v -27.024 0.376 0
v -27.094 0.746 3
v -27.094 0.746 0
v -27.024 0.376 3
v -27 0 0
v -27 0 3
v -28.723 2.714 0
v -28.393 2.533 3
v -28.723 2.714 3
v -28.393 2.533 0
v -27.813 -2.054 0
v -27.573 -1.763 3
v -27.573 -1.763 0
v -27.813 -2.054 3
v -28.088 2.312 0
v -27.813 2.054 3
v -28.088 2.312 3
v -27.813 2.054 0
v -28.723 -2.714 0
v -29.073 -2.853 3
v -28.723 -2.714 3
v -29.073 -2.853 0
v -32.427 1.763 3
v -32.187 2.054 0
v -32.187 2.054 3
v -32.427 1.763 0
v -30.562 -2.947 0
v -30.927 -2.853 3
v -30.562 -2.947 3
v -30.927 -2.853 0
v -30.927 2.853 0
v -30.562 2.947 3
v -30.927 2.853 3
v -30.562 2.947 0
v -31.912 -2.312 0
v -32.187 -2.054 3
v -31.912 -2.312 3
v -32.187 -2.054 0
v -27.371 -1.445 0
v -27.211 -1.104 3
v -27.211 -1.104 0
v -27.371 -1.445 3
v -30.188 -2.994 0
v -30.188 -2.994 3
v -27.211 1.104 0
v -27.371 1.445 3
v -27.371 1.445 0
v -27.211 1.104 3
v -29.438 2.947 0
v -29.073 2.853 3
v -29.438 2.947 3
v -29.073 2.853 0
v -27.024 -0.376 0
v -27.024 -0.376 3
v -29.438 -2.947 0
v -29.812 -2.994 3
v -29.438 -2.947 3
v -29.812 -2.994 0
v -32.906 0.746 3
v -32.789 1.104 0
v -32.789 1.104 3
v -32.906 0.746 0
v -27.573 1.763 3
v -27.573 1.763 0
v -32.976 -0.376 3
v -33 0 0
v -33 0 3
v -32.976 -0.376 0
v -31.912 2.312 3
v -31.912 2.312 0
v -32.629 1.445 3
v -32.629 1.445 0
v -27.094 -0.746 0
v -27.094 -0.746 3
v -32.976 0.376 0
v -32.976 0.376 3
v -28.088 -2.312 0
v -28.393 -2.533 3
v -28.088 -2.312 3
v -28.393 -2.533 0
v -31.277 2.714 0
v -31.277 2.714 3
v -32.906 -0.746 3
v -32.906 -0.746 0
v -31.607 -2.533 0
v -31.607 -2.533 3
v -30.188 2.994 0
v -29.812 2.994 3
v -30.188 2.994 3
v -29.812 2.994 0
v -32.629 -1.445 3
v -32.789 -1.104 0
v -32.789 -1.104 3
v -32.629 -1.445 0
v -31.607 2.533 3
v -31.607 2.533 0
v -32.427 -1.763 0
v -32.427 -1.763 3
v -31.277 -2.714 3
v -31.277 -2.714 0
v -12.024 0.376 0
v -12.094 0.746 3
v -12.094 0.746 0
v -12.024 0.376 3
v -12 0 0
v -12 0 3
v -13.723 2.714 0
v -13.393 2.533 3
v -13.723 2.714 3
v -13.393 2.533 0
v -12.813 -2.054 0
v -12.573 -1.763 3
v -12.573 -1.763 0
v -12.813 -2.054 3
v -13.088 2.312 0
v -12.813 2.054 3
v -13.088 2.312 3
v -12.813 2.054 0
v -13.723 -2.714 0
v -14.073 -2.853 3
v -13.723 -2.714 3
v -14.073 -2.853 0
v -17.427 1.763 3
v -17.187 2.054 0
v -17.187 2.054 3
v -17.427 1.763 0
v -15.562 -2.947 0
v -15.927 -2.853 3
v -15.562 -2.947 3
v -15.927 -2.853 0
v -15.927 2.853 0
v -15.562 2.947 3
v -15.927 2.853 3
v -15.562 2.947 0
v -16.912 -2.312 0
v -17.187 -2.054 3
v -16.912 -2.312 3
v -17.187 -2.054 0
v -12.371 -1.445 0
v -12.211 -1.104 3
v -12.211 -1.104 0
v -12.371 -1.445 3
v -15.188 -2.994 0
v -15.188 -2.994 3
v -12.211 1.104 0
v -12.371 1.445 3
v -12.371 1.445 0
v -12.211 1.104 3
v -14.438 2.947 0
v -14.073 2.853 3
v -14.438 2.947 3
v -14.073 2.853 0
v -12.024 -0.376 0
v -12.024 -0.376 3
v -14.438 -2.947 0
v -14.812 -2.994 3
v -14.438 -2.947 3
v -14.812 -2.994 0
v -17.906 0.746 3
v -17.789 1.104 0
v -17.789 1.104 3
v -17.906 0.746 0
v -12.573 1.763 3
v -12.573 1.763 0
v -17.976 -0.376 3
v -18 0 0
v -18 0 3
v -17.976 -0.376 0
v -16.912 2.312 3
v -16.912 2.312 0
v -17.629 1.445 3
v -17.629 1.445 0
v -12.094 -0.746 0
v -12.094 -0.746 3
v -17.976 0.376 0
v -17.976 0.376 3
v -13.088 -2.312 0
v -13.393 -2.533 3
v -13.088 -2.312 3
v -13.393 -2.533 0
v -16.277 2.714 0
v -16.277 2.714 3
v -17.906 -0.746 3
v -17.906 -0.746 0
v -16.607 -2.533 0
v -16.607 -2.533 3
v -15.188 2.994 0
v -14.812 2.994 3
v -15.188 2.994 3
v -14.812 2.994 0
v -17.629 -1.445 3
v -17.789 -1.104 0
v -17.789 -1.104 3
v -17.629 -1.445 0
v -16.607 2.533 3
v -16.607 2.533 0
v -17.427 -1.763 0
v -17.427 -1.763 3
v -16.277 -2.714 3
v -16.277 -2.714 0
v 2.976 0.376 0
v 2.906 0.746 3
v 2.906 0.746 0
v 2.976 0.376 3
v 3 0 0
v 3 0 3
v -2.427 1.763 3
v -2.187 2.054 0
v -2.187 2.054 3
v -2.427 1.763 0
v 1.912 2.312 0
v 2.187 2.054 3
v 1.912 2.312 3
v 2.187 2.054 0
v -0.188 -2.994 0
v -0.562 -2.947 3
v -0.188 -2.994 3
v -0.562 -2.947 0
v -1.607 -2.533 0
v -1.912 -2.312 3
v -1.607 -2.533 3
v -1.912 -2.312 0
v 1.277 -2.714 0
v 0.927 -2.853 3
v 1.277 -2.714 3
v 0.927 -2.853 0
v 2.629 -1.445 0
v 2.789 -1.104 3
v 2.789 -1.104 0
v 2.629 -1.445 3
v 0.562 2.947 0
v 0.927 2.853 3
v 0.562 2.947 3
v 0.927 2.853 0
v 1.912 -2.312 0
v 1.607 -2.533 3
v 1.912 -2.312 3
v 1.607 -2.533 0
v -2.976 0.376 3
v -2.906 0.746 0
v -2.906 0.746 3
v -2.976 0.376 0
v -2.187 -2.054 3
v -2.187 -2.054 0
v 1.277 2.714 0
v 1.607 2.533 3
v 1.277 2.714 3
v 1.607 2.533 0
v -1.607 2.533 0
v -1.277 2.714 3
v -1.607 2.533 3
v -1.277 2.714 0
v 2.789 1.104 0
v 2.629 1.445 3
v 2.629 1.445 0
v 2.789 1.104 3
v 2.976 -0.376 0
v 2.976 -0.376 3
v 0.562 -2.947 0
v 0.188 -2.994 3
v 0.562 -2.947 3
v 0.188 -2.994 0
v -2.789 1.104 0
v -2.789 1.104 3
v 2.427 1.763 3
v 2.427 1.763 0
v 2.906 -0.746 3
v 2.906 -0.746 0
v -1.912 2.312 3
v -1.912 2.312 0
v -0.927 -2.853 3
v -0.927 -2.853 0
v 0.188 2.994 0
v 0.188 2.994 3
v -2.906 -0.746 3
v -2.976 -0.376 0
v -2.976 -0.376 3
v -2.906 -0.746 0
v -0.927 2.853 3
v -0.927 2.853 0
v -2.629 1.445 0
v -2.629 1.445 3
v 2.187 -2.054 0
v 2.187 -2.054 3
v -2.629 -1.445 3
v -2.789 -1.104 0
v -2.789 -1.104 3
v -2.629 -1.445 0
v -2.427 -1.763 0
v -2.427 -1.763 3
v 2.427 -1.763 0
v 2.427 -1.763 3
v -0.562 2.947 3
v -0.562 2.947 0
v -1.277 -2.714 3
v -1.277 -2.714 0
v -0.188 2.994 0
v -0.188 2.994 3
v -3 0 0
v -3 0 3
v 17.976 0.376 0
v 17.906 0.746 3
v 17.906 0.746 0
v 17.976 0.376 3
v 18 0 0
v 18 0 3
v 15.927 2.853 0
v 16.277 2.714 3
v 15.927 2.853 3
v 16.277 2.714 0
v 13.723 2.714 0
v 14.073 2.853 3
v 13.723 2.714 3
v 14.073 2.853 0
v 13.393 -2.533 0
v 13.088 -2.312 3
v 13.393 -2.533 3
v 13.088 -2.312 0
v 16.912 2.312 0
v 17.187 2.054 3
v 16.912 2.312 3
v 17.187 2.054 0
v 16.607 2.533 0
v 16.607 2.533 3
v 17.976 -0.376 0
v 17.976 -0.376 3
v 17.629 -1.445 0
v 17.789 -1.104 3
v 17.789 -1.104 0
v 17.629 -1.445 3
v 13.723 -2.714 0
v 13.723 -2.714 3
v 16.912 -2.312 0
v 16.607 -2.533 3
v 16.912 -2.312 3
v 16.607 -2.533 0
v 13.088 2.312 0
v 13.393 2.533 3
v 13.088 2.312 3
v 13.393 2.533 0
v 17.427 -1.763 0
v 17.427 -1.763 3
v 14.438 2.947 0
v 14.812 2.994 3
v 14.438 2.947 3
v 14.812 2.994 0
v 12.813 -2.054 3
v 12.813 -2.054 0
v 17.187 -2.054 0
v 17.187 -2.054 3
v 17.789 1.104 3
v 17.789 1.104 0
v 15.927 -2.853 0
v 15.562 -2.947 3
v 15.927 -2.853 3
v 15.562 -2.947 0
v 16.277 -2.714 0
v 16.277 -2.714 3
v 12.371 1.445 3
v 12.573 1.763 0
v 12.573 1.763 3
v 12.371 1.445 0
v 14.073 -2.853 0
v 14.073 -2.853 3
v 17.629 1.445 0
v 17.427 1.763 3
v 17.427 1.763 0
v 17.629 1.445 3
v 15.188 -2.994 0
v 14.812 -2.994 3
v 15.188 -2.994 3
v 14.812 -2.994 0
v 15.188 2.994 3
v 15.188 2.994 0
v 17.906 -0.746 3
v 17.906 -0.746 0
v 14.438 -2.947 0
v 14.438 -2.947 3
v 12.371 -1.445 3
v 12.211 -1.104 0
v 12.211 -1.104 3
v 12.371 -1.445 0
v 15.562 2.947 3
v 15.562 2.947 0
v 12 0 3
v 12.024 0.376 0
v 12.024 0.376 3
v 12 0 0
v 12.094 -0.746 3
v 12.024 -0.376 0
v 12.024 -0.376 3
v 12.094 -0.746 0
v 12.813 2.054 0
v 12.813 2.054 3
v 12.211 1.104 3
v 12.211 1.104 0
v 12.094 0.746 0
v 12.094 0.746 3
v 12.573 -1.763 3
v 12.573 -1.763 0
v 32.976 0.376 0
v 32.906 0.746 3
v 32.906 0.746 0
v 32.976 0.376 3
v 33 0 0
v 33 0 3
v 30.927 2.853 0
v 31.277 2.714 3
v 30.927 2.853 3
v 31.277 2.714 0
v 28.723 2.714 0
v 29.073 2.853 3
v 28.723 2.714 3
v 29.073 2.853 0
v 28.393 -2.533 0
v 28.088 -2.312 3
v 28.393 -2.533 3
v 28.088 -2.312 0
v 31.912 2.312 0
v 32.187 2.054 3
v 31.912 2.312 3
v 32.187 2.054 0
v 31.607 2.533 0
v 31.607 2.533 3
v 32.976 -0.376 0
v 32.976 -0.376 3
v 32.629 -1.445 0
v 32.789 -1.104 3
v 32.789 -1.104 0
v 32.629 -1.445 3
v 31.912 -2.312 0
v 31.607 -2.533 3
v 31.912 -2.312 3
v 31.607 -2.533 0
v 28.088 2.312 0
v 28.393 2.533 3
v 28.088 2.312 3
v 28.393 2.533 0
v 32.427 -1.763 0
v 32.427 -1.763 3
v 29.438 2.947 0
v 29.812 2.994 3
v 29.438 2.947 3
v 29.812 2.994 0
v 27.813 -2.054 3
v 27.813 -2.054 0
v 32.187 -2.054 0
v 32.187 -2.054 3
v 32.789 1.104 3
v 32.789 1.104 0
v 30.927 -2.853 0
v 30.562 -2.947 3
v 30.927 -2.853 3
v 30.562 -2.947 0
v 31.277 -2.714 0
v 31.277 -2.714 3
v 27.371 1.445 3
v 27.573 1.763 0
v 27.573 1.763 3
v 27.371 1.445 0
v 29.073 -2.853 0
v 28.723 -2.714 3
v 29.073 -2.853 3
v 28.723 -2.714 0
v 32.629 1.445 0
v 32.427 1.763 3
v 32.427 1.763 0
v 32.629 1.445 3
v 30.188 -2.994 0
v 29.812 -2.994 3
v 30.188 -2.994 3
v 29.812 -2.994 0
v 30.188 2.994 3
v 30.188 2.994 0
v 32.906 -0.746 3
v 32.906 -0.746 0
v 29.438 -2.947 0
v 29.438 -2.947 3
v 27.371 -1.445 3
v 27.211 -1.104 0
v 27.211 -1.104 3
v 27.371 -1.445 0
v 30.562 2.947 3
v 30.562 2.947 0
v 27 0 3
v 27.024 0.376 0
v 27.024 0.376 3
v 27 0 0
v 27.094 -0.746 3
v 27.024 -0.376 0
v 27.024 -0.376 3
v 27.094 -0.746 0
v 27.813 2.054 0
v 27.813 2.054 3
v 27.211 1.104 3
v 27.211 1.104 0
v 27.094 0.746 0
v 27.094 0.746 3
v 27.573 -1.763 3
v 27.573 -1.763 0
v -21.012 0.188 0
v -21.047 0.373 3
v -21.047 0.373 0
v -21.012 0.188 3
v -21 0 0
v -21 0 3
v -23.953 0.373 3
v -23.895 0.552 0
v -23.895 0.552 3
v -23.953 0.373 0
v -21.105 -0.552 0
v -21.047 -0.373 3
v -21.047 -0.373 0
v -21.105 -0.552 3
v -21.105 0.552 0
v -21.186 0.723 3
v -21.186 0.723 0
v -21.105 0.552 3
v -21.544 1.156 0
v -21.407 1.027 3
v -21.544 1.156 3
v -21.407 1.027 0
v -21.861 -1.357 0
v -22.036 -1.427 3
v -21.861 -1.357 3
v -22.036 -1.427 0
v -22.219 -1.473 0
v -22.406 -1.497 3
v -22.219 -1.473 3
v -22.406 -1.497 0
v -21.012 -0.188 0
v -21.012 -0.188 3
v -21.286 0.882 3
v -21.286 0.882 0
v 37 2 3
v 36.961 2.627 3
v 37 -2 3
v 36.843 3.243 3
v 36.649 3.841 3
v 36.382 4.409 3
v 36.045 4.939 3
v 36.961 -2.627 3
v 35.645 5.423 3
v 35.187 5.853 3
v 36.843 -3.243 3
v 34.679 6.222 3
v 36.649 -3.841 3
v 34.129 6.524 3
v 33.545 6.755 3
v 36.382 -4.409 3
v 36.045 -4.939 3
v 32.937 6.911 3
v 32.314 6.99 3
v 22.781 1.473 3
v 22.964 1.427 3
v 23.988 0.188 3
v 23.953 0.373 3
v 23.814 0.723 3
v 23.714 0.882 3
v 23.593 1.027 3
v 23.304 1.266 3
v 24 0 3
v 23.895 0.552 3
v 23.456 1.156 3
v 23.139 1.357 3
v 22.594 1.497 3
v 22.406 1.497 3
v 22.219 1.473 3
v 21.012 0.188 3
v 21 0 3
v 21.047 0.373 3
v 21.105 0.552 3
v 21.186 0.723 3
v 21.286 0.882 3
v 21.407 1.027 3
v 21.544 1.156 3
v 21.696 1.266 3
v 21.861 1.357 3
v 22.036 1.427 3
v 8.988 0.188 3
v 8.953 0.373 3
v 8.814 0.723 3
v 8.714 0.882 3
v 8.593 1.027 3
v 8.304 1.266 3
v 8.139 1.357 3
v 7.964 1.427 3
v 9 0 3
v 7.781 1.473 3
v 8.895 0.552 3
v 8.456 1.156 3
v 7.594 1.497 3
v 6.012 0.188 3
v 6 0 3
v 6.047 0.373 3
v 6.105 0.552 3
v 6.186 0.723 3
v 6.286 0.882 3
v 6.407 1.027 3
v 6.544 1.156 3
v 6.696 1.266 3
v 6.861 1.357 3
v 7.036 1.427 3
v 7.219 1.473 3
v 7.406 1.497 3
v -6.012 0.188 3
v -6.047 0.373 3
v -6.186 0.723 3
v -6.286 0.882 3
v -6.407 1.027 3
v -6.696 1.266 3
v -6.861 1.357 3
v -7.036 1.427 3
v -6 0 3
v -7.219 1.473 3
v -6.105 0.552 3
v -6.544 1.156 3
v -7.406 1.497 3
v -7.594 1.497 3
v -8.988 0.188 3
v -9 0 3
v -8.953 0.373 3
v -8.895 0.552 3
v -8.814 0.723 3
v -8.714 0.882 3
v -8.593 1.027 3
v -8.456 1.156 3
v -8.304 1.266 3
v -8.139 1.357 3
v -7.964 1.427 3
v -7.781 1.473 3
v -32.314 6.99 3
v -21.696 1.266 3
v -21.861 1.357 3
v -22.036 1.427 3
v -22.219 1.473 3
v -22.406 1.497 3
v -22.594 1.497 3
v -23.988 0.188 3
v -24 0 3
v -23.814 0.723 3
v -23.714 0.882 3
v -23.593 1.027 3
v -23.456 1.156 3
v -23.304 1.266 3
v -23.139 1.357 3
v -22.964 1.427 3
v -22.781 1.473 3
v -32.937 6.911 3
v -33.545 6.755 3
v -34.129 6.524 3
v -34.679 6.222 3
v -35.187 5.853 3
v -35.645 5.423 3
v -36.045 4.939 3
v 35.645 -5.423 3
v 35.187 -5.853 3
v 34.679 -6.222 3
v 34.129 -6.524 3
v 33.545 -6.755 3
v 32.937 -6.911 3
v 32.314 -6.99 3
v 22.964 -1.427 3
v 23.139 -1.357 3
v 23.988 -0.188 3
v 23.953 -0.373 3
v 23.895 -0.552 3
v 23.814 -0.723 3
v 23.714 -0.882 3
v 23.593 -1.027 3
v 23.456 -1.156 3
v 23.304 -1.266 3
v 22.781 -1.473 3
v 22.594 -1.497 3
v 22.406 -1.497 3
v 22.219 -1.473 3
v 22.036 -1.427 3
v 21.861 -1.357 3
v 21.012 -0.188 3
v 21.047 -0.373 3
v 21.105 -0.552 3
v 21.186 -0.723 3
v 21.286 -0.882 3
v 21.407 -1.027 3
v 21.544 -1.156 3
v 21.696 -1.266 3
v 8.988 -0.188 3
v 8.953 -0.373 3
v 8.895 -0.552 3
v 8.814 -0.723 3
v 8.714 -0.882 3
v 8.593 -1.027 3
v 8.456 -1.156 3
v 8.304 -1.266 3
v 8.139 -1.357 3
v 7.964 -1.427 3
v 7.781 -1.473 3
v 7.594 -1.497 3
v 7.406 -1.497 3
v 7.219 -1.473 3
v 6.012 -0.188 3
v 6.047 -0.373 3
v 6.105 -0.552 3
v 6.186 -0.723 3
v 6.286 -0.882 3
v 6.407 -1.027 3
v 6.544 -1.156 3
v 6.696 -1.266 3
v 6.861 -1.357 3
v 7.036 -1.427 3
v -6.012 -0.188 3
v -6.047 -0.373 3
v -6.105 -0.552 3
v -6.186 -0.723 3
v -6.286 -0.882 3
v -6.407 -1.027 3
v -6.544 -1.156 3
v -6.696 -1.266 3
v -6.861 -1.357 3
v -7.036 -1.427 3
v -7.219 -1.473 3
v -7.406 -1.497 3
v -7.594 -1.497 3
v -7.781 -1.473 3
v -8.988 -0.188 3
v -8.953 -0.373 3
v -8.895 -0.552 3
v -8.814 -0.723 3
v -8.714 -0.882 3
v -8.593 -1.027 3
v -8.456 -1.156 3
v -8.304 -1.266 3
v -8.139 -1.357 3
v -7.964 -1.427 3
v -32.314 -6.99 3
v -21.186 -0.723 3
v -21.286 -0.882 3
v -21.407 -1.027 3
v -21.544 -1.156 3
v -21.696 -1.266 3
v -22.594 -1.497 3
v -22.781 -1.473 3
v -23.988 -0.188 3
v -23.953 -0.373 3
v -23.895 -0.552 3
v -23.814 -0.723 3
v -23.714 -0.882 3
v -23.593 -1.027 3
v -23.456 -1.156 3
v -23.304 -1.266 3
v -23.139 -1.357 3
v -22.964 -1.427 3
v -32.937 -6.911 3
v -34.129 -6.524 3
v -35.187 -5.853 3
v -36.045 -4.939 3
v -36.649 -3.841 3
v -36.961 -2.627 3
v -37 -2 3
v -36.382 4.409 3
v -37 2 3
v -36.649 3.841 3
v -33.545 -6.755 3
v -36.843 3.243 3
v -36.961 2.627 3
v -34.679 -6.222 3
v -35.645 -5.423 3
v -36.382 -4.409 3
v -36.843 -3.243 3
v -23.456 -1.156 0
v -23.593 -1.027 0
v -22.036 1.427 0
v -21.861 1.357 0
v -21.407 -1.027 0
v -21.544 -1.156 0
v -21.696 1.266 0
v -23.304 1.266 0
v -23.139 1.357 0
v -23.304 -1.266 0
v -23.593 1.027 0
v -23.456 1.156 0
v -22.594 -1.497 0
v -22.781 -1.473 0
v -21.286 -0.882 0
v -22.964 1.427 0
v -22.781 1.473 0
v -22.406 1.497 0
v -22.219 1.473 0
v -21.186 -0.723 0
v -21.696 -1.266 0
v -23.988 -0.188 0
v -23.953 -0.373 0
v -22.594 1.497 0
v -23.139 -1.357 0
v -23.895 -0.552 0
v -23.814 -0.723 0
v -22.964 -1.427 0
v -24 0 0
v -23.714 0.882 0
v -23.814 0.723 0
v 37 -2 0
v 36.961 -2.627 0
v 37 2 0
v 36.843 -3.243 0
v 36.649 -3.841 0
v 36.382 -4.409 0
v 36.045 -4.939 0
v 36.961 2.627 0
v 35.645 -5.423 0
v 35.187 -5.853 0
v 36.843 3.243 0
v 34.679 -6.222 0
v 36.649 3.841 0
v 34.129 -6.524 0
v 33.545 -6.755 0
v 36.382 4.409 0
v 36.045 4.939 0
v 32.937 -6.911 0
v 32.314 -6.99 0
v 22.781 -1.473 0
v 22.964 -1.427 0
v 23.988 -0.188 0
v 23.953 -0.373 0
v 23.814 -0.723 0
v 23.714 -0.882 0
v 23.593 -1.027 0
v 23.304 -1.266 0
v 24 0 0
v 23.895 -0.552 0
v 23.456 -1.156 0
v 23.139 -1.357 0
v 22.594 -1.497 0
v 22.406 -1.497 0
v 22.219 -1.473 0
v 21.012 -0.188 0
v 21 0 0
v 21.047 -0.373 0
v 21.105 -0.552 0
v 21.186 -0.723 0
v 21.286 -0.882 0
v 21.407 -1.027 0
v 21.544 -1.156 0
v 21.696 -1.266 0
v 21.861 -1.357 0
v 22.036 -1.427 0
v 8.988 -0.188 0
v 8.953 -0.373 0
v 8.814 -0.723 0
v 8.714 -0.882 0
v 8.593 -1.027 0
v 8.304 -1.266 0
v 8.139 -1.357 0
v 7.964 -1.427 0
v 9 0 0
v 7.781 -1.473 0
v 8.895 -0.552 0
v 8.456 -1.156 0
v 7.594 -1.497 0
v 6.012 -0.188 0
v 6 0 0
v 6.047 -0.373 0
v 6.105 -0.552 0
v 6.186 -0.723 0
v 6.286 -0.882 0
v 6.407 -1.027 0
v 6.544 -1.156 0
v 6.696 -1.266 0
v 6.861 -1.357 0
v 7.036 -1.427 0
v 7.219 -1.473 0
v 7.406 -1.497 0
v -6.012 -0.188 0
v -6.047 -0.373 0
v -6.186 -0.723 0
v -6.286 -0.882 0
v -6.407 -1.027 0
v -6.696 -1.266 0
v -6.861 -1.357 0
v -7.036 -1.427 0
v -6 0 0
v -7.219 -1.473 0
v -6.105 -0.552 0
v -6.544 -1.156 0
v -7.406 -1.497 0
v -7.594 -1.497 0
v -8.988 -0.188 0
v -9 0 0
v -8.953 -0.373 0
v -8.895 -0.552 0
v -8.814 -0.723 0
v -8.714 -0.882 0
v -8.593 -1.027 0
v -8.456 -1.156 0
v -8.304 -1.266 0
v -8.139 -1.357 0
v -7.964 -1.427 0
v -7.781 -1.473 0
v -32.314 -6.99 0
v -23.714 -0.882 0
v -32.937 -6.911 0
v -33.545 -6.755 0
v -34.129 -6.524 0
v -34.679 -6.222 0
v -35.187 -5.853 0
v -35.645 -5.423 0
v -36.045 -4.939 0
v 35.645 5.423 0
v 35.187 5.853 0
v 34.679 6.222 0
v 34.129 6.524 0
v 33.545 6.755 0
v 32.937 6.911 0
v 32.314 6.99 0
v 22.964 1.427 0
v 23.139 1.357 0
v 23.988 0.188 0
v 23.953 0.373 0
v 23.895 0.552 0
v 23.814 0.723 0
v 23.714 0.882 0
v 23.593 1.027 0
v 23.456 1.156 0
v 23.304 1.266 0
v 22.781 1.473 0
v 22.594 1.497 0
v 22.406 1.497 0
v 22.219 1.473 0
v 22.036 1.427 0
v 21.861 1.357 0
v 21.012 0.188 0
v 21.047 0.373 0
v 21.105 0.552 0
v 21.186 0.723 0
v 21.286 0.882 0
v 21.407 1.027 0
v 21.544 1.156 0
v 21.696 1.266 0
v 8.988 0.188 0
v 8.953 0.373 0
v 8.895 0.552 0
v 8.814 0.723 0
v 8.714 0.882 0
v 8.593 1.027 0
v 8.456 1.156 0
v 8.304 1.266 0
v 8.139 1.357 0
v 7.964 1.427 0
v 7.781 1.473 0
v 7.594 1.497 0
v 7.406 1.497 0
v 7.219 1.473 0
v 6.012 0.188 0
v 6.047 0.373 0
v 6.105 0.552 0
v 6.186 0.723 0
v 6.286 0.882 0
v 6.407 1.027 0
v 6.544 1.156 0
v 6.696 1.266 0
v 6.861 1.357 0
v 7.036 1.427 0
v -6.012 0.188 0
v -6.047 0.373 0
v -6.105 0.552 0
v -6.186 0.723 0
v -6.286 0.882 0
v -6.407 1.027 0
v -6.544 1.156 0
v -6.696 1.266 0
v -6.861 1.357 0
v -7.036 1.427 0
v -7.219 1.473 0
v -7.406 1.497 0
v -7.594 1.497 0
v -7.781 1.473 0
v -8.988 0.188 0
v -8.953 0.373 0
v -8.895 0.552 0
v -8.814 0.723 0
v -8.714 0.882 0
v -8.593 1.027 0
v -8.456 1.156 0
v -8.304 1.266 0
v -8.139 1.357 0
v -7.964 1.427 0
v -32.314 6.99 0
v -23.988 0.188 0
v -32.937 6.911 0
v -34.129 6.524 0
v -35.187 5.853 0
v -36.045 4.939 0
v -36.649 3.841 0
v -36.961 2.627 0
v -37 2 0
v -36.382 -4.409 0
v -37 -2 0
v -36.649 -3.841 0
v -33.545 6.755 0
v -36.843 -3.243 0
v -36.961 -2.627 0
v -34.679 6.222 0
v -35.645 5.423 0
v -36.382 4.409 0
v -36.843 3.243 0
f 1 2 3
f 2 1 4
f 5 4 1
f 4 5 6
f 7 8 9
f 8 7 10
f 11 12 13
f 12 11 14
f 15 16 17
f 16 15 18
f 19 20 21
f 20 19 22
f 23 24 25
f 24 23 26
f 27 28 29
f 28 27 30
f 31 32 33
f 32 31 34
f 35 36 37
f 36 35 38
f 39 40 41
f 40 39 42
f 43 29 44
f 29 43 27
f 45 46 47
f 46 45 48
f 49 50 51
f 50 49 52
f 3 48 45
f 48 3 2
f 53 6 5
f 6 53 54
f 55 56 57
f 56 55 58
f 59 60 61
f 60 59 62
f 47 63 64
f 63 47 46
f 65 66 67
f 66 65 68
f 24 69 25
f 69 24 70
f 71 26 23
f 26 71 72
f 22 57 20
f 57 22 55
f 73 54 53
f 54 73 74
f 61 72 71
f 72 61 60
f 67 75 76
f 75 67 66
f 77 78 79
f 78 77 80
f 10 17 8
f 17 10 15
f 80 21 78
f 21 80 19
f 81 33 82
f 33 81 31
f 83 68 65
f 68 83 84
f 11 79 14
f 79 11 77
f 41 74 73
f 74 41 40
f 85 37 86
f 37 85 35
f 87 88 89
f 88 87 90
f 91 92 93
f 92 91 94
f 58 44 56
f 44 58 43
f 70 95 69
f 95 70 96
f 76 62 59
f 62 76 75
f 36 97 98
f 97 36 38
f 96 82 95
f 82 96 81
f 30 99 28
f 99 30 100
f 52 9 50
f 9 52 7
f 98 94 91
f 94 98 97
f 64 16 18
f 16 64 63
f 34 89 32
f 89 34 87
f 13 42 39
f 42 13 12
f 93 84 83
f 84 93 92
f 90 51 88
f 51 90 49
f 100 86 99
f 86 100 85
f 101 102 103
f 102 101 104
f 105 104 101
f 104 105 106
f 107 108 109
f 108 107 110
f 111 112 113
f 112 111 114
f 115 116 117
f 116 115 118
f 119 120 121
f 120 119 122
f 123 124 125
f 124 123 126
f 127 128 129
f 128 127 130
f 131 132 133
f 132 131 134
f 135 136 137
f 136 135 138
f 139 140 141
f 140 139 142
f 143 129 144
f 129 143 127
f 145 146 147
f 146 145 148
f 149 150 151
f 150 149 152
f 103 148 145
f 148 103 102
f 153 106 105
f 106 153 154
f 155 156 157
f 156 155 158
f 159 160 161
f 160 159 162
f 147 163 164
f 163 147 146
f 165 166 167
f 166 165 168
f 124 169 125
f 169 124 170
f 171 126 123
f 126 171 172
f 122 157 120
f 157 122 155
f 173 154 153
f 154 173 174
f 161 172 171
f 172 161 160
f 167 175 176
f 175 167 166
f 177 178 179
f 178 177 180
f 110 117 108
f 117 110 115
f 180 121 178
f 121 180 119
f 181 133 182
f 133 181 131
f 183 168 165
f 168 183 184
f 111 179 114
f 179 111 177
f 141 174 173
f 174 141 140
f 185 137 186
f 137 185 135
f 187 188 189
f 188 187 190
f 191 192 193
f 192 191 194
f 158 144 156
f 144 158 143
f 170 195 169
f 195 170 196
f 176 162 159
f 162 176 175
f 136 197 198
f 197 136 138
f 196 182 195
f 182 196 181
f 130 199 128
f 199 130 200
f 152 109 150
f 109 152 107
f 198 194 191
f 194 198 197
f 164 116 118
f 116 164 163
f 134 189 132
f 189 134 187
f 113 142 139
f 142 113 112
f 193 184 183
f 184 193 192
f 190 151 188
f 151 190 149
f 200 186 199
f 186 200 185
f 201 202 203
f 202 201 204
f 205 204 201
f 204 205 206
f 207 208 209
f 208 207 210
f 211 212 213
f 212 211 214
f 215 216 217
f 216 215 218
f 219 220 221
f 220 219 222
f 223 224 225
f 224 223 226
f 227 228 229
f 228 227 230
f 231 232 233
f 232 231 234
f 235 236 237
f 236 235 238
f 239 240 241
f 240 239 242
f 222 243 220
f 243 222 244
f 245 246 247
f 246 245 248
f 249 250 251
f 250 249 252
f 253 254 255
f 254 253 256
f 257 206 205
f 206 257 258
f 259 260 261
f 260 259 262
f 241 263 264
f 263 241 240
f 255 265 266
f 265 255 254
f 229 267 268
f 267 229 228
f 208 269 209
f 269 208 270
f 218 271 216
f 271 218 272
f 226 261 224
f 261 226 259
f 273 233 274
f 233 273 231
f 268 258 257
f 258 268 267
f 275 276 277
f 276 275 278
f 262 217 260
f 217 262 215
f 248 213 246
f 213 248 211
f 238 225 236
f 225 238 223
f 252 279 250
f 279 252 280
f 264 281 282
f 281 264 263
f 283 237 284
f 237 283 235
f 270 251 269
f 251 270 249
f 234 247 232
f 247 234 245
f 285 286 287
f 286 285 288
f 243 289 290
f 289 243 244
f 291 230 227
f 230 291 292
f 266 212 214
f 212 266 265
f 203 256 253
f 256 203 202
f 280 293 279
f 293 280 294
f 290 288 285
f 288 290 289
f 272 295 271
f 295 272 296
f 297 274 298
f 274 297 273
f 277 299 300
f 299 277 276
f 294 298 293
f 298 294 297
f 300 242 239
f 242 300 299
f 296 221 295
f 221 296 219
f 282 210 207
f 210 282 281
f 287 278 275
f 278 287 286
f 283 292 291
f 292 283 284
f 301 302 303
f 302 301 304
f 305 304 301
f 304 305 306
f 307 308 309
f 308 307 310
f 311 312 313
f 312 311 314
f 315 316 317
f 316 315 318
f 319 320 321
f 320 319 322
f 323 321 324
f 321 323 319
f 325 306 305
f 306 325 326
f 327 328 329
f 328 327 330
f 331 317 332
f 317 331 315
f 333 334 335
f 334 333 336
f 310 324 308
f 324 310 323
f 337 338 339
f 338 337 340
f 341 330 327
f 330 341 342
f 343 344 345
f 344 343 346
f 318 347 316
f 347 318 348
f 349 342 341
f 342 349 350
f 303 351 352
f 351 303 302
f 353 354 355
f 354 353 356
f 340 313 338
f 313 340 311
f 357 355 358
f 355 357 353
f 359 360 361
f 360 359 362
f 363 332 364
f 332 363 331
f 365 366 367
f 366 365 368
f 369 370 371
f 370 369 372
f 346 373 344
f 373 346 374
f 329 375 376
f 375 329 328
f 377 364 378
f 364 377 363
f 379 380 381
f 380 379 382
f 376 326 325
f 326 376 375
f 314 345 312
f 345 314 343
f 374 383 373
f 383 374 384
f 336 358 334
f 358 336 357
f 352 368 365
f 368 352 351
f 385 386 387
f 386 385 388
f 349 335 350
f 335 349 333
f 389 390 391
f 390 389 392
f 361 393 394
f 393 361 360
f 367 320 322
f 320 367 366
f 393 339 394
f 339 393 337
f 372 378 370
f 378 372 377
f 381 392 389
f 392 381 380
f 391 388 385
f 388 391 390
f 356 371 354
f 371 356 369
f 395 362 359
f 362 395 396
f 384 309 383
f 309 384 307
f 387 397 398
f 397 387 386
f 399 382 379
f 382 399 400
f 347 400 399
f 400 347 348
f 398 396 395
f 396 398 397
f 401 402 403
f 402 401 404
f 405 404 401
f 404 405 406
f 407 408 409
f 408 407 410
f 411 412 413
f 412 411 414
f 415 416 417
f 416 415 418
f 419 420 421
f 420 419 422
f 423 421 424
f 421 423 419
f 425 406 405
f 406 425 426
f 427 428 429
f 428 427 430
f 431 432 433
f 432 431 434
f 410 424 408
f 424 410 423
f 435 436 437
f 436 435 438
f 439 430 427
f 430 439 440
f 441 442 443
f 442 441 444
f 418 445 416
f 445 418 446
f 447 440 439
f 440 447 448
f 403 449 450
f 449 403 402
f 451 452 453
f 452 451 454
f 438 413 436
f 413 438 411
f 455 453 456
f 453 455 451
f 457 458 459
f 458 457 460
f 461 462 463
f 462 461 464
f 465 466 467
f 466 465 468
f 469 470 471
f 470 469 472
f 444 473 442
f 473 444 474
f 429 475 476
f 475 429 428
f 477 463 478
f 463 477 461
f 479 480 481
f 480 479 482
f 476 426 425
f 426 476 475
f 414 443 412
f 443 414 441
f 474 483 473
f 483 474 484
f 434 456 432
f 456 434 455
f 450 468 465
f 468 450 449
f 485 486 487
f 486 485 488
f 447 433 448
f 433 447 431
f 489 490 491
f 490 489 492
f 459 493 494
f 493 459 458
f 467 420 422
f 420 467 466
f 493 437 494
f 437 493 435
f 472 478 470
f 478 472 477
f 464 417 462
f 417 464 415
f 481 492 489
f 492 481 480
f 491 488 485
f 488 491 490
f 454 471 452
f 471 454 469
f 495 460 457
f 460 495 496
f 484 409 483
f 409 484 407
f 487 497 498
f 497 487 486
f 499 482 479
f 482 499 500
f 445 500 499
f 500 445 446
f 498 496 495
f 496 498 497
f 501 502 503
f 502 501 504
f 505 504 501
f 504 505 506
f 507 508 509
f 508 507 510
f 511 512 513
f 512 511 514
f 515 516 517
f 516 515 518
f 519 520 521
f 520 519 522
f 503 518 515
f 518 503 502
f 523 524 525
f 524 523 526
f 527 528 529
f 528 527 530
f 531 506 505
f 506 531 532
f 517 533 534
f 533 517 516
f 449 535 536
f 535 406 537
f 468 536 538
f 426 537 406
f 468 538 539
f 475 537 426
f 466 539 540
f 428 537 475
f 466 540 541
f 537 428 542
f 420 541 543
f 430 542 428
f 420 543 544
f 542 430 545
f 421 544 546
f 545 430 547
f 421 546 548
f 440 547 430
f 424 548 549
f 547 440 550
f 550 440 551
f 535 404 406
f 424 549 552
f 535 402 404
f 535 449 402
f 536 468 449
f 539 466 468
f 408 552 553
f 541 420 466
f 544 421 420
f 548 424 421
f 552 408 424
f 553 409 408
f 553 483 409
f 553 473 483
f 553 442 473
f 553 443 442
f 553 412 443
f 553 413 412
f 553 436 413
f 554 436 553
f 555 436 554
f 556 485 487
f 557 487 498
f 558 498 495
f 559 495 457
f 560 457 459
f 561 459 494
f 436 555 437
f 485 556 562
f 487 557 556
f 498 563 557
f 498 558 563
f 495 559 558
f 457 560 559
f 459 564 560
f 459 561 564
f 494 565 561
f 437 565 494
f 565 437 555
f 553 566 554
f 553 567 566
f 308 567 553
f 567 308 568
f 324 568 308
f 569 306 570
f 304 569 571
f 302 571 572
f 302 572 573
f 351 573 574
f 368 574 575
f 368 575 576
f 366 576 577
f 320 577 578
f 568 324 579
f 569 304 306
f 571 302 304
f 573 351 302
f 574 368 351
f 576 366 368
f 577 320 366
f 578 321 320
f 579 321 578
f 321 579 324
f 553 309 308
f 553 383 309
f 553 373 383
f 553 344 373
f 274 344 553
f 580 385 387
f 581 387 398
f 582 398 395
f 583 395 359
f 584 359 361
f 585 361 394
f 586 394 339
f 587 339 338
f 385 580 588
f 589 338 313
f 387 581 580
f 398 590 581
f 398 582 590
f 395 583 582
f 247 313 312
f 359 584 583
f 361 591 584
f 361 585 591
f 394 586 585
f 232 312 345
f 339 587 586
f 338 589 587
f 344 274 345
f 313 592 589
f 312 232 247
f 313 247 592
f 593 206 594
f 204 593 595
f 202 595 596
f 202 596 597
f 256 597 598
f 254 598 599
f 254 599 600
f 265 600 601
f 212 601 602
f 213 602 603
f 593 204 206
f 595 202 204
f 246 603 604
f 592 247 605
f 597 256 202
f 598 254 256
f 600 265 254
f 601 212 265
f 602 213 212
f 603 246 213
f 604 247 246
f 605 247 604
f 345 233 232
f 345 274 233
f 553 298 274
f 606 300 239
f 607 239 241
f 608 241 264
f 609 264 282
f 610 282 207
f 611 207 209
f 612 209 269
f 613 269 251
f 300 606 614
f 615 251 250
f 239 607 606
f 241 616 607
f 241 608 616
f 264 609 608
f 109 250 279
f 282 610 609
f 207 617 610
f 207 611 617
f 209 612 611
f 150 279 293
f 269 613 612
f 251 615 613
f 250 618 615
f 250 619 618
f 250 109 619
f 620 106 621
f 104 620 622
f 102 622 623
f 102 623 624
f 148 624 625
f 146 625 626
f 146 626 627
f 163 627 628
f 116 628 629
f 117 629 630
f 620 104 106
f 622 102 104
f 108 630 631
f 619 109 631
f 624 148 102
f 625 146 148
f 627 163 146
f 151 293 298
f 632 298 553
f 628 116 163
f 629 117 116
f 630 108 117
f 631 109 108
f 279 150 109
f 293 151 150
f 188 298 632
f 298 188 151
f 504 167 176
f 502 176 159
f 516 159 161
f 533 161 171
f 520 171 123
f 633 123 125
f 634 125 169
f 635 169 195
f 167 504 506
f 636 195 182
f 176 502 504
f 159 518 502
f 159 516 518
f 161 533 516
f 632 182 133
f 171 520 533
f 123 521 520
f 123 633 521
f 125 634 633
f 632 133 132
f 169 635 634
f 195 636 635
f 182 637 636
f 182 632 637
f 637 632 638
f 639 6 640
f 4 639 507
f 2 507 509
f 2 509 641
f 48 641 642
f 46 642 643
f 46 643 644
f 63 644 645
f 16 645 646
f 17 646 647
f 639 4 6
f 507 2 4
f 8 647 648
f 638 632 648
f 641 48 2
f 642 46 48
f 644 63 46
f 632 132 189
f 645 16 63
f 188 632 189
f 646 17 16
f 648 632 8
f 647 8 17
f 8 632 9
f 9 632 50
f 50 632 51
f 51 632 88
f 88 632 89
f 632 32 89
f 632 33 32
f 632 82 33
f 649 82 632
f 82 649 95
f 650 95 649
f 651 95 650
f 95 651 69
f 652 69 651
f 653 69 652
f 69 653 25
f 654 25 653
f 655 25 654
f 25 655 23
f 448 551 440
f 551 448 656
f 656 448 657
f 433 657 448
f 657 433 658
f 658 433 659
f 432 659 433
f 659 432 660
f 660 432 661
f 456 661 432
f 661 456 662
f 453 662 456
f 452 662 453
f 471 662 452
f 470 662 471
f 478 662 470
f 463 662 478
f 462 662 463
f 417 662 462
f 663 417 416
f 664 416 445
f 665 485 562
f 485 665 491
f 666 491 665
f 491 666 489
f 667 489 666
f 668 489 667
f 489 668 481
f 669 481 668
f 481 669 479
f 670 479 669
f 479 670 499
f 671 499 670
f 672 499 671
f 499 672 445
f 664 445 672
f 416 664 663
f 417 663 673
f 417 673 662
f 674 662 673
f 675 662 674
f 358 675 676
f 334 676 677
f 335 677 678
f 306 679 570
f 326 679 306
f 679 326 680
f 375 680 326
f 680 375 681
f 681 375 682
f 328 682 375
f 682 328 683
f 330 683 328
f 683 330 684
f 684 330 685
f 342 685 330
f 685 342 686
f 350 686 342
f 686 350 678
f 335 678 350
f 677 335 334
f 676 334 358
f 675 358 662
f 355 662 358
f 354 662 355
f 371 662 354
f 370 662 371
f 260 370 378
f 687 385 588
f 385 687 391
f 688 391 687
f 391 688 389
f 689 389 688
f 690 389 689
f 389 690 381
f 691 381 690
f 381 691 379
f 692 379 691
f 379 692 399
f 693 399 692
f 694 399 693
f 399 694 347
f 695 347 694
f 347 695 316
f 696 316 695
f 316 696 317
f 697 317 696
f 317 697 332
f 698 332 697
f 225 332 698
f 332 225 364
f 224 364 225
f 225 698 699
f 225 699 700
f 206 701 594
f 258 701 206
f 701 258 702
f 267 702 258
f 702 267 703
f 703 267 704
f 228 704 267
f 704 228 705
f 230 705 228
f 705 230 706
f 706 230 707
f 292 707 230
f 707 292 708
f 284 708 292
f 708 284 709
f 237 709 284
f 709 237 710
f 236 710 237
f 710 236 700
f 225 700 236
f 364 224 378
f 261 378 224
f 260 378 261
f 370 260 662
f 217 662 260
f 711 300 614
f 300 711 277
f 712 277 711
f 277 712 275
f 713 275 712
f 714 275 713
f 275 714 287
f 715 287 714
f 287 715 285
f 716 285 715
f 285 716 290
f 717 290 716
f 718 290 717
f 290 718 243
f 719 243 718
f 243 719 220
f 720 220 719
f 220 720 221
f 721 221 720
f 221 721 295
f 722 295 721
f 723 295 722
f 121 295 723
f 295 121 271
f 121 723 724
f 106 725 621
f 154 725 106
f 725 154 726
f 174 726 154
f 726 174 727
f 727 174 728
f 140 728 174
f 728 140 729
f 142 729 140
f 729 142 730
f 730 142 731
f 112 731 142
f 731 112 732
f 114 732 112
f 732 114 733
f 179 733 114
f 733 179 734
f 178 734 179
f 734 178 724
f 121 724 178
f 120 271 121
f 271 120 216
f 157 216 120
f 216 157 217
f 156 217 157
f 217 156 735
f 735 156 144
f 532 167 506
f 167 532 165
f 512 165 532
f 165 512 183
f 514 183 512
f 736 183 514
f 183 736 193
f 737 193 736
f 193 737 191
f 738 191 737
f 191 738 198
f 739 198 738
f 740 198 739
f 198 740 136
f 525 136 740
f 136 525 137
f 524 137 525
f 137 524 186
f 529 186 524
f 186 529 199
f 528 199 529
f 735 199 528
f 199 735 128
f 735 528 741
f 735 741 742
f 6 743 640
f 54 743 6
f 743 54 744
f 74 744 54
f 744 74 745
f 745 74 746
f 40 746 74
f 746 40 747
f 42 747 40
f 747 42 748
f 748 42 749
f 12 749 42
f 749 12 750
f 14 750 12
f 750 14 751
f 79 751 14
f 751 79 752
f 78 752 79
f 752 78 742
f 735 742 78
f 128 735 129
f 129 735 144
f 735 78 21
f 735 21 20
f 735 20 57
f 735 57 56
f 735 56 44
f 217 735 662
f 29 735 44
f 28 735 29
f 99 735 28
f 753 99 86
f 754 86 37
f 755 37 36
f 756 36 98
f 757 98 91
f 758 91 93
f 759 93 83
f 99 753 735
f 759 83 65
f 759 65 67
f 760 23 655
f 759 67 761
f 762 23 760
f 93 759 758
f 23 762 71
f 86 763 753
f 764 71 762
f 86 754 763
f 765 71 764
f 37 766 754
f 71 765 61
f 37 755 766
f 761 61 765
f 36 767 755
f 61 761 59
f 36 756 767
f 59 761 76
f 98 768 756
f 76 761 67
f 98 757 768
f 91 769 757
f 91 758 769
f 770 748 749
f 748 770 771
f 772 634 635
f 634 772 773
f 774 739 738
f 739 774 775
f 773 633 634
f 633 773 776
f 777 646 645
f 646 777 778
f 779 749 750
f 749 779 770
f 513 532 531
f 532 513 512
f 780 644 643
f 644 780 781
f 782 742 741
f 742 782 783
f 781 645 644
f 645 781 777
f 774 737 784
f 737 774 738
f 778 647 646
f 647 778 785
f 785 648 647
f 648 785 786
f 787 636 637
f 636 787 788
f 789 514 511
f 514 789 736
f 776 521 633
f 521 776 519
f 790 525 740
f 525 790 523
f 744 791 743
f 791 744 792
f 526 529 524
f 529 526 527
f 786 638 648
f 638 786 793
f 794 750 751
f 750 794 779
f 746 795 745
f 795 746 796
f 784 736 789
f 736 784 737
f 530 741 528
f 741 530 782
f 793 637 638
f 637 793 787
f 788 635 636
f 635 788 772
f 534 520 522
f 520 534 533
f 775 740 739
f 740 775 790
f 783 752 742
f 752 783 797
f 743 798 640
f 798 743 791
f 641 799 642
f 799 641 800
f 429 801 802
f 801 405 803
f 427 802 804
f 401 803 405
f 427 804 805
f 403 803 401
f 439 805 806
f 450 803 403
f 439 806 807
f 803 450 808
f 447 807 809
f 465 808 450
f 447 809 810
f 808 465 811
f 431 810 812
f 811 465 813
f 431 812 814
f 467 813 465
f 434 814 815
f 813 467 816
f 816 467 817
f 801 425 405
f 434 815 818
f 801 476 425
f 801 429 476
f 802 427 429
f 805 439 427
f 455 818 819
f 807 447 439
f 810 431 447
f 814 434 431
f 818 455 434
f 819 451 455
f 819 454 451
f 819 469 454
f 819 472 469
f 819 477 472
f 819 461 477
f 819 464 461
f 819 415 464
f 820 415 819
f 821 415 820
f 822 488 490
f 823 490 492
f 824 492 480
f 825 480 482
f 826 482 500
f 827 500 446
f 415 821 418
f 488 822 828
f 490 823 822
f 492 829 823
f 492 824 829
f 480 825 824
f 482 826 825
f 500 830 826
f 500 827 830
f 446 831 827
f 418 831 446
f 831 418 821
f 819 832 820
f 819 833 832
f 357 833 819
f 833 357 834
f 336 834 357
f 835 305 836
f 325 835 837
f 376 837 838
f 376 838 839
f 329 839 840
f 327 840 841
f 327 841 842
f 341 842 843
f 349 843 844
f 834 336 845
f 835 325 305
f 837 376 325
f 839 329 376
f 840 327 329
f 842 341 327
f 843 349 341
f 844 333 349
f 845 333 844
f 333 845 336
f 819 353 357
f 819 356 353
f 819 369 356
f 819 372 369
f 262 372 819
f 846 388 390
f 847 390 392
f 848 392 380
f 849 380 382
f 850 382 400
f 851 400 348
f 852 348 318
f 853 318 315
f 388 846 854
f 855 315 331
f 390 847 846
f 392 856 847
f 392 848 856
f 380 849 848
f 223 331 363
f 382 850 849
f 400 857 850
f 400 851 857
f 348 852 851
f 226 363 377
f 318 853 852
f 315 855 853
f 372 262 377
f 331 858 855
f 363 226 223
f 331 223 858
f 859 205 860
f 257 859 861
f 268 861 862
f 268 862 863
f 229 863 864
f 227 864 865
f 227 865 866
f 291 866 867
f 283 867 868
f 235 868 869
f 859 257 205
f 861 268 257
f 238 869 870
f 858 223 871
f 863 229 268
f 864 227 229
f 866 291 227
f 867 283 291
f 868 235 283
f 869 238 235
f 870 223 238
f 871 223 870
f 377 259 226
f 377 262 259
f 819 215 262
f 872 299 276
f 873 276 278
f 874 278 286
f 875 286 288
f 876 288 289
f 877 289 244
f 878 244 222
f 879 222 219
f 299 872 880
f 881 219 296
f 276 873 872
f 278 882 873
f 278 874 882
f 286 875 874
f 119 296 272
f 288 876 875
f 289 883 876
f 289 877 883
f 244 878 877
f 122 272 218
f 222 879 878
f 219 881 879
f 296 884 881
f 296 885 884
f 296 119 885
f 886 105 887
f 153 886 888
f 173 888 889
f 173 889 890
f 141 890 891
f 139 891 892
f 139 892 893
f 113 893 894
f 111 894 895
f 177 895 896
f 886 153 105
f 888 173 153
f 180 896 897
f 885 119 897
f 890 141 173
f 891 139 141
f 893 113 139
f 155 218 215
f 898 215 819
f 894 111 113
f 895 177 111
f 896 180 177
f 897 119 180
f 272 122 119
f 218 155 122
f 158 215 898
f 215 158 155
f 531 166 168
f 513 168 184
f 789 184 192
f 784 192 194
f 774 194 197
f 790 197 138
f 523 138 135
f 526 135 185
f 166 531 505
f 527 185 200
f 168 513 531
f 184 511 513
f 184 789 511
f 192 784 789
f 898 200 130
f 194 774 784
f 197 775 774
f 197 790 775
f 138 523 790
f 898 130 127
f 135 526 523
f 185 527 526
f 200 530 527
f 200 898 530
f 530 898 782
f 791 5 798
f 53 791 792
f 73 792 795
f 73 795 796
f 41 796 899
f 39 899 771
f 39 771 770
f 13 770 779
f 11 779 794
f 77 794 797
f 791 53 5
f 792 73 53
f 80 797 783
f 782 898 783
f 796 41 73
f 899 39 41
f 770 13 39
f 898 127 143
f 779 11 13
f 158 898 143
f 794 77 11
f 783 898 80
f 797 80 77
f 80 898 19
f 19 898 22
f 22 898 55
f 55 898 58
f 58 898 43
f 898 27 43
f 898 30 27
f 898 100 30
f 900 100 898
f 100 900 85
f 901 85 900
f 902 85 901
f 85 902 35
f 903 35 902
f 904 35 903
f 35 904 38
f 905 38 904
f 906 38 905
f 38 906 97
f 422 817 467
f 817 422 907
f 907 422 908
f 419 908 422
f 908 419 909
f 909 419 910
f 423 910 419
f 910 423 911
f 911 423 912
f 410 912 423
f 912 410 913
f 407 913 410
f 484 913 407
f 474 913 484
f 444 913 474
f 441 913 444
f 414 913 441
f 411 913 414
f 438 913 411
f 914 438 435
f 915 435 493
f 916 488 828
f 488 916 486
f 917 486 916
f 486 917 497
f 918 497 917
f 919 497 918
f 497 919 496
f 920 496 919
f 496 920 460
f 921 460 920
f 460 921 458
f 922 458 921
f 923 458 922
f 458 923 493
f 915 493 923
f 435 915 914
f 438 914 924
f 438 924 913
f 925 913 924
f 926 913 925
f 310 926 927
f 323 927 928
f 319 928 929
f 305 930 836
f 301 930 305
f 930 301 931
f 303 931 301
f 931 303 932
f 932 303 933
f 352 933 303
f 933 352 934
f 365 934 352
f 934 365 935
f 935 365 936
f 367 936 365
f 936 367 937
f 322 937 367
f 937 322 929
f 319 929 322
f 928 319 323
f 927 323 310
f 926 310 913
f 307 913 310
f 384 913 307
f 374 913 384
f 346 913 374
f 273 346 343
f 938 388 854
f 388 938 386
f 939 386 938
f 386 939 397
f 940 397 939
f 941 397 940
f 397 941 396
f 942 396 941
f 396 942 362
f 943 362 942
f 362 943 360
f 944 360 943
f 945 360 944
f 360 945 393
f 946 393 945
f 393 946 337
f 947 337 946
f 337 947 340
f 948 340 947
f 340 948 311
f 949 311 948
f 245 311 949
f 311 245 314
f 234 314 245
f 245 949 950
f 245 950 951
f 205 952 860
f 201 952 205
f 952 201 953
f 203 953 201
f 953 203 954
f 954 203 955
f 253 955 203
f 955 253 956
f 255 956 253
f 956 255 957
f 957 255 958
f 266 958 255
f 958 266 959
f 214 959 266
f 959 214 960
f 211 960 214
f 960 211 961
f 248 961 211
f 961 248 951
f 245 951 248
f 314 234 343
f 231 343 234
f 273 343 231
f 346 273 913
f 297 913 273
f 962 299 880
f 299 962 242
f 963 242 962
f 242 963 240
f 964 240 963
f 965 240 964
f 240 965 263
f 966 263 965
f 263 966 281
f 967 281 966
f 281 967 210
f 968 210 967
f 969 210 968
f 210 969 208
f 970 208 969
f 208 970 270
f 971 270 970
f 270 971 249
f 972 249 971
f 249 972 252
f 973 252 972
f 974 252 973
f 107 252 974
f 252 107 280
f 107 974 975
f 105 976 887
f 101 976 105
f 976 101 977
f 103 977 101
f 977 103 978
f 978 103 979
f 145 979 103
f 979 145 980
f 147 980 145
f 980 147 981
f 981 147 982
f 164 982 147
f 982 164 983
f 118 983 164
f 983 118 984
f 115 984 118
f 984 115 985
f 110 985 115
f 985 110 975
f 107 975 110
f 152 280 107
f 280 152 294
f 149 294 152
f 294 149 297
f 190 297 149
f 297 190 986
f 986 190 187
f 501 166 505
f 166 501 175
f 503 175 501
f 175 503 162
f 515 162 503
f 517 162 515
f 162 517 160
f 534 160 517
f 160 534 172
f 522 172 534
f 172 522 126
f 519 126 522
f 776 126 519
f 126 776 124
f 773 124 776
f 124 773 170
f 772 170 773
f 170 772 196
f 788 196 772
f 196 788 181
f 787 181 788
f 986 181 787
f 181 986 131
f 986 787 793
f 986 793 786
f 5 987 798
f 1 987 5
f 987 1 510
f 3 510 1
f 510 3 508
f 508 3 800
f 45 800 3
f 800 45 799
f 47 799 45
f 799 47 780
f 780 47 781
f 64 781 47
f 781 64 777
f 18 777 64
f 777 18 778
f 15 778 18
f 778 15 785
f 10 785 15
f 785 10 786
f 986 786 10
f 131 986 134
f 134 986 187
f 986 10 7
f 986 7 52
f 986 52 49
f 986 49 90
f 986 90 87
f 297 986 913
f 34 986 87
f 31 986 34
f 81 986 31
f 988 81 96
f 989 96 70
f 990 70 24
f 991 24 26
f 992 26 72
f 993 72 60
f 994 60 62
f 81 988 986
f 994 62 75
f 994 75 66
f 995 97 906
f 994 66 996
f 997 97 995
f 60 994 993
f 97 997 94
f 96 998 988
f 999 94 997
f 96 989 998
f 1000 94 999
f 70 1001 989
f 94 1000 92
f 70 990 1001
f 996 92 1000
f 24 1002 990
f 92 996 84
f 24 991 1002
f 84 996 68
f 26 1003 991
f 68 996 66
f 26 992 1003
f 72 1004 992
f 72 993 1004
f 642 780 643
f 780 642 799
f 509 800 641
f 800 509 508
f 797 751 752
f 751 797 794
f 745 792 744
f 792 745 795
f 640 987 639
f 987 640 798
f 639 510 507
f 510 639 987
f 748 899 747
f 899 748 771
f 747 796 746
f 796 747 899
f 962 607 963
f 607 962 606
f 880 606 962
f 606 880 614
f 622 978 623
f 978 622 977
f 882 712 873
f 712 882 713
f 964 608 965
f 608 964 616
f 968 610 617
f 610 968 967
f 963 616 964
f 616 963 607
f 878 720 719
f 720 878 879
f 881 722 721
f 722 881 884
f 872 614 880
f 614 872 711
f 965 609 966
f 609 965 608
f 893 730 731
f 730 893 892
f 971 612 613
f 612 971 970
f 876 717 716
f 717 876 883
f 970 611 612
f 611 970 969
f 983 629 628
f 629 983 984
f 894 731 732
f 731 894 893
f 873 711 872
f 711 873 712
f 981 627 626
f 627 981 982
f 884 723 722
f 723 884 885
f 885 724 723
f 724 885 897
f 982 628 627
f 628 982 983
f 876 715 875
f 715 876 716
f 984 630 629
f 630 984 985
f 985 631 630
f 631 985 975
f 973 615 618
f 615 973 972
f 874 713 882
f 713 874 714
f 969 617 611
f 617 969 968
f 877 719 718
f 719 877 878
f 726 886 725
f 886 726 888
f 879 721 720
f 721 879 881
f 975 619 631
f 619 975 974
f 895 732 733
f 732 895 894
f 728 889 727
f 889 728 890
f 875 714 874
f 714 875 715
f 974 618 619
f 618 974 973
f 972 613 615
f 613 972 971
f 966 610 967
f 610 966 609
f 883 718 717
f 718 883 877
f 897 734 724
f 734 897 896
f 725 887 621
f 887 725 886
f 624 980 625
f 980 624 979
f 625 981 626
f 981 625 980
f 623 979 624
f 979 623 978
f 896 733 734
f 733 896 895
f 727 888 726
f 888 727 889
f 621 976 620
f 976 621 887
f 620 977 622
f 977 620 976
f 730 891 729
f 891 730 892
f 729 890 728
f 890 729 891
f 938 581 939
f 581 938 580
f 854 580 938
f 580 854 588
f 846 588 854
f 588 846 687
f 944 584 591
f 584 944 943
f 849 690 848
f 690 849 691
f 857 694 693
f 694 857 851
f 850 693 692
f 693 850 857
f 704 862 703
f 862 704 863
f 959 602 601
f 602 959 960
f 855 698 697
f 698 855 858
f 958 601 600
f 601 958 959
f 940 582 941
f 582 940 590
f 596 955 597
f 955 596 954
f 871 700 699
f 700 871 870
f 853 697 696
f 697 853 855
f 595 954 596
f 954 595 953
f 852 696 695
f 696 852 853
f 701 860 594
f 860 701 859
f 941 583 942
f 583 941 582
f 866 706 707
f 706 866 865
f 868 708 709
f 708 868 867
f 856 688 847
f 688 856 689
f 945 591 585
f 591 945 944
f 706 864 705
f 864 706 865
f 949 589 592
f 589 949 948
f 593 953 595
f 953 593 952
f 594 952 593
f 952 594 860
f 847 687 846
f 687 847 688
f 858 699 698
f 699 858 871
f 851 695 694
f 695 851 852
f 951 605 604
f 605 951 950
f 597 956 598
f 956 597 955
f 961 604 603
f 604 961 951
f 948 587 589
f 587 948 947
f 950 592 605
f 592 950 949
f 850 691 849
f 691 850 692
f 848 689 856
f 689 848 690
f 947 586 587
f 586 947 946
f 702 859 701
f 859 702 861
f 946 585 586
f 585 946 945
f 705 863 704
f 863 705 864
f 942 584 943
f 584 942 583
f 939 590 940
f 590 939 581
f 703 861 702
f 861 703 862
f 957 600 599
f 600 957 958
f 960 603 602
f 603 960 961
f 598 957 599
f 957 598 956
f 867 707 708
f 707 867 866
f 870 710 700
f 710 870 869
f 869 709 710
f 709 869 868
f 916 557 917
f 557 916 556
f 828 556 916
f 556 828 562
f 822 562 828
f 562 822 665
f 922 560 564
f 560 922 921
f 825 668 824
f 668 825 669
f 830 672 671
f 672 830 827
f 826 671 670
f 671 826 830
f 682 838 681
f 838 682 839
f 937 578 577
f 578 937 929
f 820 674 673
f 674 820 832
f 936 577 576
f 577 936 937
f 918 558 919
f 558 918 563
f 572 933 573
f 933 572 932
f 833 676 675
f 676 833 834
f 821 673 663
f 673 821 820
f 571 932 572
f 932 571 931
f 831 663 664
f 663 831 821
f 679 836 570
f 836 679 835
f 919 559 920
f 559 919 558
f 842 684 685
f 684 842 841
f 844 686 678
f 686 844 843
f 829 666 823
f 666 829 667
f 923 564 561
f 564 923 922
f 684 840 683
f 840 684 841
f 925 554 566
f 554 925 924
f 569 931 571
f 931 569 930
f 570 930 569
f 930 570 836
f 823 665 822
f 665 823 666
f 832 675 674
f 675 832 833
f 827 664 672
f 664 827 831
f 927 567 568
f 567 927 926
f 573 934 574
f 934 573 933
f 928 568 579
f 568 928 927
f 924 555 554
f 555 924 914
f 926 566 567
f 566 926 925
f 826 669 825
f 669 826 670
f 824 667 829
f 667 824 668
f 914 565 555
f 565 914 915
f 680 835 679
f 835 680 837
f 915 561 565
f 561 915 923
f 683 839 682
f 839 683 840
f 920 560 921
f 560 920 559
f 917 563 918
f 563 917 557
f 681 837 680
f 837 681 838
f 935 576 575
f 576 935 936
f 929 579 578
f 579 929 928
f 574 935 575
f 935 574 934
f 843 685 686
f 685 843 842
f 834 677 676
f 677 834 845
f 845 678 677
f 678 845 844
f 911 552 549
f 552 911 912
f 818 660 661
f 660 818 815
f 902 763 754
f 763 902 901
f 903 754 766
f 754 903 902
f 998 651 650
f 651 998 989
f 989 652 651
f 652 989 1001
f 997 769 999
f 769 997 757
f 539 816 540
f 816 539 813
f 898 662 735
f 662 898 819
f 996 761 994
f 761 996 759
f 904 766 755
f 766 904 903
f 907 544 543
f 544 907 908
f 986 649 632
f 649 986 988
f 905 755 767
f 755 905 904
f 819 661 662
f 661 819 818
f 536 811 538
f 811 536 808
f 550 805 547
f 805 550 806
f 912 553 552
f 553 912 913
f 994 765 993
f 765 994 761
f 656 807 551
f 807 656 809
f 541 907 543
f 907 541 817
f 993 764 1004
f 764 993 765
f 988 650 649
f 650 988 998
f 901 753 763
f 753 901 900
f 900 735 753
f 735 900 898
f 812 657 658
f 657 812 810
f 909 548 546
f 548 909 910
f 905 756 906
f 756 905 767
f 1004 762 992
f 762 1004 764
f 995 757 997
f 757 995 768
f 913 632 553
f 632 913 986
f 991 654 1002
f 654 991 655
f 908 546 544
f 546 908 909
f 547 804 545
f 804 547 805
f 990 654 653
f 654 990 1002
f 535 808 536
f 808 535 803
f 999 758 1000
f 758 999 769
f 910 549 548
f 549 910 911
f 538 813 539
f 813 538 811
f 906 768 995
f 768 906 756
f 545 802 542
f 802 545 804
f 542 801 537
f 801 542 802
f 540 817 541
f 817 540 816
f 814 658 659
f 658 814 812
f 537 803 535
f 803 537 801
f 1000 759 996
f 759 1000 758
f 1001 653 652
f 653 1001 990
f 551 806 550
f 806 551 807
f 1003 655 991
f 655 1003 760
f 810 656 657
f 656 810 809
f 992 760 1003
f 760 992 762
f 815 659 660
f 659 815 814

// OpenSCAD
$fn = 50;


difference() {
	union() {
		hull() {
			translate(v = [-32.0000000000, 2.0000000000, 0]) {
				cylinder(h = 3, r = 5);
			}
			translate(v = [32.0000000000, 2.0000000000, 0]) {
				cylinder(h = 3, r = 5);
			}
			translate(v = [-32.0000000000, -2.0000000000, 0]) {
				cylinder(h = 3, r = 5);
			}
			translate(v = [32.0000000000, -2.0000000000, 0]) {
				cylinder(h = 3, r = 5);
			}
		}
	}
	union() {
		translate(v = [-30.0000000000, 0.0000000000, -100.0000000000]) {
			cylinder(h = 200, r = 3.0000000000);
		}
		translate(v = [-15.0000000000, 0.0000000000, -100.0000000000]) {
			cylinder(h = 200, r = 3.0000000000);
		}
		translate(v = [0.0000000000, 0.0000000000, -100.0000000000]) {
			cylinder(h = 200, r = 3.0000000000);
		}
		translate(v = [15.0000000000, 0.0000000000, -100.0000000000]) {
			cylinder(h = 200, r = 3.0000000000);
		}
		translate(v = [30.0000000000, 0.0000000000, -100.0000000000]) {
			cylinder(h = 200, r = 3.0000000000);
		}
		translate(v = [-30.0000000000, 0.0000000000, 0]) {
			cylinder(h = 3, r = 1.5000000000);
		}
		translate(v = [-22.5000000000, 0.0000000000, 0]) {
			cylinder(h = 3, r = 1.5000000000);
		}
		translate(v = [-15.0000000000, 0.0000000000, 0]) {
			cylinder(h = 3, r = 1.5000000000);
		}
		translate(v = [-7.5000000000, 0.0000000000, 0]) {
			cylinder(h = 3, r = 1.5000000000);
		}
		cylinder(h = 3, r = 1.5000000000);
		translate(v = [7.5000000000, 0.0000000000, 0]) {
			cylinder(h = 3, r = 1.5000000000);
		}
		translate(v = [15.0000000000, 0.0000000000, 0]) {
			cylinder(h = 3, r = 1.5000000000);
		}
		translate(v = [22.5000000000, 0.0000000000, 0]) {
			cylinder(h = 3, r = 1.5000000000);
		}
		translate(v = [30.0000000000, 0.0000000000, 0]) {
			cylinder(h = 3, r = 1.5000000000);
		}
		translate(v = [-30.0000000000, 0.0000000000, 0]) {
			cylinder(h = 3, r = 1.5000000000);
		}
		translate(v = [-22.5000000000, 0.0000000000, 0]) {
			cylinder(h = 3, r = 1.5000000000);
		}
		translate(v = [-15.0000000000, 0.0000000000, 0]) {
			cylinder(h = 3, r = 1.5000000000);
		}
		translate(v = [-7.5000000000, 0.0000000000, 0]) {
			cylinder(h = 3, r = 1.5000000000);
		}
		cylinder(h = 3, r = 1.5000000000);
		translate(v = [7.5000000000, 0.0000000000, 0]) {
			cylinder(h = 3, r = 1.5000000000);
		}
		translate(v = [15.0000000000, 0.0000000000, 0]) {
			cylinder(h = 3, r = 1.5000000000);
		}
		translate(v = [22.5000000000, 0.0000000000, 0]) {
			cylinder(h = 3, r = 1.5000000000);
		}
		translate(v = [30.0000000000, 0.0000000000, 0]) {
			cylinder(h = 3, r = 1.5000000000);
		}
		translate(v = [-30.0000000000, 0.0000000000, 0]) {
			cylinder(h = 3, r = 1.5000000000);
		}
		translate(v = [-22.5000000000, 0.0000000000, 0]) {
			cylinder(h = 3, r = 1.5000000000);
		}
		translate(v = [-15.0000000000, 0.0000000000, 0]) {
			cylinder(h = 3, r = 1.5000000000);
		}
		translate(v = [-7.5000000000, 0.0000000000, 0]) {
			cylinder(h = 3, r = 1.5000000000);
		}
		cylinder(h = 3, r = 1.5000000000);
		translate(v = [7.5000000000, 0.0000000000, 0]) {
			cylinder(h = 3, r = 1.5000000000);
		}
		translate(v = [15.0000000000, 0.0000000000, 0]) {
			cylinder(h = 3, r = 1.5000000000);
		}
		translate(v = [22.5000000000, 0.0000000000, 0]) {
			cylinder(h = 3, r = 1.5000000000);
		}
		translate(v = [30.0000000000, 0.0000000000, 0]) {
			cylinder(h = 3, r = 1.5000000000);
		}
	}
}
